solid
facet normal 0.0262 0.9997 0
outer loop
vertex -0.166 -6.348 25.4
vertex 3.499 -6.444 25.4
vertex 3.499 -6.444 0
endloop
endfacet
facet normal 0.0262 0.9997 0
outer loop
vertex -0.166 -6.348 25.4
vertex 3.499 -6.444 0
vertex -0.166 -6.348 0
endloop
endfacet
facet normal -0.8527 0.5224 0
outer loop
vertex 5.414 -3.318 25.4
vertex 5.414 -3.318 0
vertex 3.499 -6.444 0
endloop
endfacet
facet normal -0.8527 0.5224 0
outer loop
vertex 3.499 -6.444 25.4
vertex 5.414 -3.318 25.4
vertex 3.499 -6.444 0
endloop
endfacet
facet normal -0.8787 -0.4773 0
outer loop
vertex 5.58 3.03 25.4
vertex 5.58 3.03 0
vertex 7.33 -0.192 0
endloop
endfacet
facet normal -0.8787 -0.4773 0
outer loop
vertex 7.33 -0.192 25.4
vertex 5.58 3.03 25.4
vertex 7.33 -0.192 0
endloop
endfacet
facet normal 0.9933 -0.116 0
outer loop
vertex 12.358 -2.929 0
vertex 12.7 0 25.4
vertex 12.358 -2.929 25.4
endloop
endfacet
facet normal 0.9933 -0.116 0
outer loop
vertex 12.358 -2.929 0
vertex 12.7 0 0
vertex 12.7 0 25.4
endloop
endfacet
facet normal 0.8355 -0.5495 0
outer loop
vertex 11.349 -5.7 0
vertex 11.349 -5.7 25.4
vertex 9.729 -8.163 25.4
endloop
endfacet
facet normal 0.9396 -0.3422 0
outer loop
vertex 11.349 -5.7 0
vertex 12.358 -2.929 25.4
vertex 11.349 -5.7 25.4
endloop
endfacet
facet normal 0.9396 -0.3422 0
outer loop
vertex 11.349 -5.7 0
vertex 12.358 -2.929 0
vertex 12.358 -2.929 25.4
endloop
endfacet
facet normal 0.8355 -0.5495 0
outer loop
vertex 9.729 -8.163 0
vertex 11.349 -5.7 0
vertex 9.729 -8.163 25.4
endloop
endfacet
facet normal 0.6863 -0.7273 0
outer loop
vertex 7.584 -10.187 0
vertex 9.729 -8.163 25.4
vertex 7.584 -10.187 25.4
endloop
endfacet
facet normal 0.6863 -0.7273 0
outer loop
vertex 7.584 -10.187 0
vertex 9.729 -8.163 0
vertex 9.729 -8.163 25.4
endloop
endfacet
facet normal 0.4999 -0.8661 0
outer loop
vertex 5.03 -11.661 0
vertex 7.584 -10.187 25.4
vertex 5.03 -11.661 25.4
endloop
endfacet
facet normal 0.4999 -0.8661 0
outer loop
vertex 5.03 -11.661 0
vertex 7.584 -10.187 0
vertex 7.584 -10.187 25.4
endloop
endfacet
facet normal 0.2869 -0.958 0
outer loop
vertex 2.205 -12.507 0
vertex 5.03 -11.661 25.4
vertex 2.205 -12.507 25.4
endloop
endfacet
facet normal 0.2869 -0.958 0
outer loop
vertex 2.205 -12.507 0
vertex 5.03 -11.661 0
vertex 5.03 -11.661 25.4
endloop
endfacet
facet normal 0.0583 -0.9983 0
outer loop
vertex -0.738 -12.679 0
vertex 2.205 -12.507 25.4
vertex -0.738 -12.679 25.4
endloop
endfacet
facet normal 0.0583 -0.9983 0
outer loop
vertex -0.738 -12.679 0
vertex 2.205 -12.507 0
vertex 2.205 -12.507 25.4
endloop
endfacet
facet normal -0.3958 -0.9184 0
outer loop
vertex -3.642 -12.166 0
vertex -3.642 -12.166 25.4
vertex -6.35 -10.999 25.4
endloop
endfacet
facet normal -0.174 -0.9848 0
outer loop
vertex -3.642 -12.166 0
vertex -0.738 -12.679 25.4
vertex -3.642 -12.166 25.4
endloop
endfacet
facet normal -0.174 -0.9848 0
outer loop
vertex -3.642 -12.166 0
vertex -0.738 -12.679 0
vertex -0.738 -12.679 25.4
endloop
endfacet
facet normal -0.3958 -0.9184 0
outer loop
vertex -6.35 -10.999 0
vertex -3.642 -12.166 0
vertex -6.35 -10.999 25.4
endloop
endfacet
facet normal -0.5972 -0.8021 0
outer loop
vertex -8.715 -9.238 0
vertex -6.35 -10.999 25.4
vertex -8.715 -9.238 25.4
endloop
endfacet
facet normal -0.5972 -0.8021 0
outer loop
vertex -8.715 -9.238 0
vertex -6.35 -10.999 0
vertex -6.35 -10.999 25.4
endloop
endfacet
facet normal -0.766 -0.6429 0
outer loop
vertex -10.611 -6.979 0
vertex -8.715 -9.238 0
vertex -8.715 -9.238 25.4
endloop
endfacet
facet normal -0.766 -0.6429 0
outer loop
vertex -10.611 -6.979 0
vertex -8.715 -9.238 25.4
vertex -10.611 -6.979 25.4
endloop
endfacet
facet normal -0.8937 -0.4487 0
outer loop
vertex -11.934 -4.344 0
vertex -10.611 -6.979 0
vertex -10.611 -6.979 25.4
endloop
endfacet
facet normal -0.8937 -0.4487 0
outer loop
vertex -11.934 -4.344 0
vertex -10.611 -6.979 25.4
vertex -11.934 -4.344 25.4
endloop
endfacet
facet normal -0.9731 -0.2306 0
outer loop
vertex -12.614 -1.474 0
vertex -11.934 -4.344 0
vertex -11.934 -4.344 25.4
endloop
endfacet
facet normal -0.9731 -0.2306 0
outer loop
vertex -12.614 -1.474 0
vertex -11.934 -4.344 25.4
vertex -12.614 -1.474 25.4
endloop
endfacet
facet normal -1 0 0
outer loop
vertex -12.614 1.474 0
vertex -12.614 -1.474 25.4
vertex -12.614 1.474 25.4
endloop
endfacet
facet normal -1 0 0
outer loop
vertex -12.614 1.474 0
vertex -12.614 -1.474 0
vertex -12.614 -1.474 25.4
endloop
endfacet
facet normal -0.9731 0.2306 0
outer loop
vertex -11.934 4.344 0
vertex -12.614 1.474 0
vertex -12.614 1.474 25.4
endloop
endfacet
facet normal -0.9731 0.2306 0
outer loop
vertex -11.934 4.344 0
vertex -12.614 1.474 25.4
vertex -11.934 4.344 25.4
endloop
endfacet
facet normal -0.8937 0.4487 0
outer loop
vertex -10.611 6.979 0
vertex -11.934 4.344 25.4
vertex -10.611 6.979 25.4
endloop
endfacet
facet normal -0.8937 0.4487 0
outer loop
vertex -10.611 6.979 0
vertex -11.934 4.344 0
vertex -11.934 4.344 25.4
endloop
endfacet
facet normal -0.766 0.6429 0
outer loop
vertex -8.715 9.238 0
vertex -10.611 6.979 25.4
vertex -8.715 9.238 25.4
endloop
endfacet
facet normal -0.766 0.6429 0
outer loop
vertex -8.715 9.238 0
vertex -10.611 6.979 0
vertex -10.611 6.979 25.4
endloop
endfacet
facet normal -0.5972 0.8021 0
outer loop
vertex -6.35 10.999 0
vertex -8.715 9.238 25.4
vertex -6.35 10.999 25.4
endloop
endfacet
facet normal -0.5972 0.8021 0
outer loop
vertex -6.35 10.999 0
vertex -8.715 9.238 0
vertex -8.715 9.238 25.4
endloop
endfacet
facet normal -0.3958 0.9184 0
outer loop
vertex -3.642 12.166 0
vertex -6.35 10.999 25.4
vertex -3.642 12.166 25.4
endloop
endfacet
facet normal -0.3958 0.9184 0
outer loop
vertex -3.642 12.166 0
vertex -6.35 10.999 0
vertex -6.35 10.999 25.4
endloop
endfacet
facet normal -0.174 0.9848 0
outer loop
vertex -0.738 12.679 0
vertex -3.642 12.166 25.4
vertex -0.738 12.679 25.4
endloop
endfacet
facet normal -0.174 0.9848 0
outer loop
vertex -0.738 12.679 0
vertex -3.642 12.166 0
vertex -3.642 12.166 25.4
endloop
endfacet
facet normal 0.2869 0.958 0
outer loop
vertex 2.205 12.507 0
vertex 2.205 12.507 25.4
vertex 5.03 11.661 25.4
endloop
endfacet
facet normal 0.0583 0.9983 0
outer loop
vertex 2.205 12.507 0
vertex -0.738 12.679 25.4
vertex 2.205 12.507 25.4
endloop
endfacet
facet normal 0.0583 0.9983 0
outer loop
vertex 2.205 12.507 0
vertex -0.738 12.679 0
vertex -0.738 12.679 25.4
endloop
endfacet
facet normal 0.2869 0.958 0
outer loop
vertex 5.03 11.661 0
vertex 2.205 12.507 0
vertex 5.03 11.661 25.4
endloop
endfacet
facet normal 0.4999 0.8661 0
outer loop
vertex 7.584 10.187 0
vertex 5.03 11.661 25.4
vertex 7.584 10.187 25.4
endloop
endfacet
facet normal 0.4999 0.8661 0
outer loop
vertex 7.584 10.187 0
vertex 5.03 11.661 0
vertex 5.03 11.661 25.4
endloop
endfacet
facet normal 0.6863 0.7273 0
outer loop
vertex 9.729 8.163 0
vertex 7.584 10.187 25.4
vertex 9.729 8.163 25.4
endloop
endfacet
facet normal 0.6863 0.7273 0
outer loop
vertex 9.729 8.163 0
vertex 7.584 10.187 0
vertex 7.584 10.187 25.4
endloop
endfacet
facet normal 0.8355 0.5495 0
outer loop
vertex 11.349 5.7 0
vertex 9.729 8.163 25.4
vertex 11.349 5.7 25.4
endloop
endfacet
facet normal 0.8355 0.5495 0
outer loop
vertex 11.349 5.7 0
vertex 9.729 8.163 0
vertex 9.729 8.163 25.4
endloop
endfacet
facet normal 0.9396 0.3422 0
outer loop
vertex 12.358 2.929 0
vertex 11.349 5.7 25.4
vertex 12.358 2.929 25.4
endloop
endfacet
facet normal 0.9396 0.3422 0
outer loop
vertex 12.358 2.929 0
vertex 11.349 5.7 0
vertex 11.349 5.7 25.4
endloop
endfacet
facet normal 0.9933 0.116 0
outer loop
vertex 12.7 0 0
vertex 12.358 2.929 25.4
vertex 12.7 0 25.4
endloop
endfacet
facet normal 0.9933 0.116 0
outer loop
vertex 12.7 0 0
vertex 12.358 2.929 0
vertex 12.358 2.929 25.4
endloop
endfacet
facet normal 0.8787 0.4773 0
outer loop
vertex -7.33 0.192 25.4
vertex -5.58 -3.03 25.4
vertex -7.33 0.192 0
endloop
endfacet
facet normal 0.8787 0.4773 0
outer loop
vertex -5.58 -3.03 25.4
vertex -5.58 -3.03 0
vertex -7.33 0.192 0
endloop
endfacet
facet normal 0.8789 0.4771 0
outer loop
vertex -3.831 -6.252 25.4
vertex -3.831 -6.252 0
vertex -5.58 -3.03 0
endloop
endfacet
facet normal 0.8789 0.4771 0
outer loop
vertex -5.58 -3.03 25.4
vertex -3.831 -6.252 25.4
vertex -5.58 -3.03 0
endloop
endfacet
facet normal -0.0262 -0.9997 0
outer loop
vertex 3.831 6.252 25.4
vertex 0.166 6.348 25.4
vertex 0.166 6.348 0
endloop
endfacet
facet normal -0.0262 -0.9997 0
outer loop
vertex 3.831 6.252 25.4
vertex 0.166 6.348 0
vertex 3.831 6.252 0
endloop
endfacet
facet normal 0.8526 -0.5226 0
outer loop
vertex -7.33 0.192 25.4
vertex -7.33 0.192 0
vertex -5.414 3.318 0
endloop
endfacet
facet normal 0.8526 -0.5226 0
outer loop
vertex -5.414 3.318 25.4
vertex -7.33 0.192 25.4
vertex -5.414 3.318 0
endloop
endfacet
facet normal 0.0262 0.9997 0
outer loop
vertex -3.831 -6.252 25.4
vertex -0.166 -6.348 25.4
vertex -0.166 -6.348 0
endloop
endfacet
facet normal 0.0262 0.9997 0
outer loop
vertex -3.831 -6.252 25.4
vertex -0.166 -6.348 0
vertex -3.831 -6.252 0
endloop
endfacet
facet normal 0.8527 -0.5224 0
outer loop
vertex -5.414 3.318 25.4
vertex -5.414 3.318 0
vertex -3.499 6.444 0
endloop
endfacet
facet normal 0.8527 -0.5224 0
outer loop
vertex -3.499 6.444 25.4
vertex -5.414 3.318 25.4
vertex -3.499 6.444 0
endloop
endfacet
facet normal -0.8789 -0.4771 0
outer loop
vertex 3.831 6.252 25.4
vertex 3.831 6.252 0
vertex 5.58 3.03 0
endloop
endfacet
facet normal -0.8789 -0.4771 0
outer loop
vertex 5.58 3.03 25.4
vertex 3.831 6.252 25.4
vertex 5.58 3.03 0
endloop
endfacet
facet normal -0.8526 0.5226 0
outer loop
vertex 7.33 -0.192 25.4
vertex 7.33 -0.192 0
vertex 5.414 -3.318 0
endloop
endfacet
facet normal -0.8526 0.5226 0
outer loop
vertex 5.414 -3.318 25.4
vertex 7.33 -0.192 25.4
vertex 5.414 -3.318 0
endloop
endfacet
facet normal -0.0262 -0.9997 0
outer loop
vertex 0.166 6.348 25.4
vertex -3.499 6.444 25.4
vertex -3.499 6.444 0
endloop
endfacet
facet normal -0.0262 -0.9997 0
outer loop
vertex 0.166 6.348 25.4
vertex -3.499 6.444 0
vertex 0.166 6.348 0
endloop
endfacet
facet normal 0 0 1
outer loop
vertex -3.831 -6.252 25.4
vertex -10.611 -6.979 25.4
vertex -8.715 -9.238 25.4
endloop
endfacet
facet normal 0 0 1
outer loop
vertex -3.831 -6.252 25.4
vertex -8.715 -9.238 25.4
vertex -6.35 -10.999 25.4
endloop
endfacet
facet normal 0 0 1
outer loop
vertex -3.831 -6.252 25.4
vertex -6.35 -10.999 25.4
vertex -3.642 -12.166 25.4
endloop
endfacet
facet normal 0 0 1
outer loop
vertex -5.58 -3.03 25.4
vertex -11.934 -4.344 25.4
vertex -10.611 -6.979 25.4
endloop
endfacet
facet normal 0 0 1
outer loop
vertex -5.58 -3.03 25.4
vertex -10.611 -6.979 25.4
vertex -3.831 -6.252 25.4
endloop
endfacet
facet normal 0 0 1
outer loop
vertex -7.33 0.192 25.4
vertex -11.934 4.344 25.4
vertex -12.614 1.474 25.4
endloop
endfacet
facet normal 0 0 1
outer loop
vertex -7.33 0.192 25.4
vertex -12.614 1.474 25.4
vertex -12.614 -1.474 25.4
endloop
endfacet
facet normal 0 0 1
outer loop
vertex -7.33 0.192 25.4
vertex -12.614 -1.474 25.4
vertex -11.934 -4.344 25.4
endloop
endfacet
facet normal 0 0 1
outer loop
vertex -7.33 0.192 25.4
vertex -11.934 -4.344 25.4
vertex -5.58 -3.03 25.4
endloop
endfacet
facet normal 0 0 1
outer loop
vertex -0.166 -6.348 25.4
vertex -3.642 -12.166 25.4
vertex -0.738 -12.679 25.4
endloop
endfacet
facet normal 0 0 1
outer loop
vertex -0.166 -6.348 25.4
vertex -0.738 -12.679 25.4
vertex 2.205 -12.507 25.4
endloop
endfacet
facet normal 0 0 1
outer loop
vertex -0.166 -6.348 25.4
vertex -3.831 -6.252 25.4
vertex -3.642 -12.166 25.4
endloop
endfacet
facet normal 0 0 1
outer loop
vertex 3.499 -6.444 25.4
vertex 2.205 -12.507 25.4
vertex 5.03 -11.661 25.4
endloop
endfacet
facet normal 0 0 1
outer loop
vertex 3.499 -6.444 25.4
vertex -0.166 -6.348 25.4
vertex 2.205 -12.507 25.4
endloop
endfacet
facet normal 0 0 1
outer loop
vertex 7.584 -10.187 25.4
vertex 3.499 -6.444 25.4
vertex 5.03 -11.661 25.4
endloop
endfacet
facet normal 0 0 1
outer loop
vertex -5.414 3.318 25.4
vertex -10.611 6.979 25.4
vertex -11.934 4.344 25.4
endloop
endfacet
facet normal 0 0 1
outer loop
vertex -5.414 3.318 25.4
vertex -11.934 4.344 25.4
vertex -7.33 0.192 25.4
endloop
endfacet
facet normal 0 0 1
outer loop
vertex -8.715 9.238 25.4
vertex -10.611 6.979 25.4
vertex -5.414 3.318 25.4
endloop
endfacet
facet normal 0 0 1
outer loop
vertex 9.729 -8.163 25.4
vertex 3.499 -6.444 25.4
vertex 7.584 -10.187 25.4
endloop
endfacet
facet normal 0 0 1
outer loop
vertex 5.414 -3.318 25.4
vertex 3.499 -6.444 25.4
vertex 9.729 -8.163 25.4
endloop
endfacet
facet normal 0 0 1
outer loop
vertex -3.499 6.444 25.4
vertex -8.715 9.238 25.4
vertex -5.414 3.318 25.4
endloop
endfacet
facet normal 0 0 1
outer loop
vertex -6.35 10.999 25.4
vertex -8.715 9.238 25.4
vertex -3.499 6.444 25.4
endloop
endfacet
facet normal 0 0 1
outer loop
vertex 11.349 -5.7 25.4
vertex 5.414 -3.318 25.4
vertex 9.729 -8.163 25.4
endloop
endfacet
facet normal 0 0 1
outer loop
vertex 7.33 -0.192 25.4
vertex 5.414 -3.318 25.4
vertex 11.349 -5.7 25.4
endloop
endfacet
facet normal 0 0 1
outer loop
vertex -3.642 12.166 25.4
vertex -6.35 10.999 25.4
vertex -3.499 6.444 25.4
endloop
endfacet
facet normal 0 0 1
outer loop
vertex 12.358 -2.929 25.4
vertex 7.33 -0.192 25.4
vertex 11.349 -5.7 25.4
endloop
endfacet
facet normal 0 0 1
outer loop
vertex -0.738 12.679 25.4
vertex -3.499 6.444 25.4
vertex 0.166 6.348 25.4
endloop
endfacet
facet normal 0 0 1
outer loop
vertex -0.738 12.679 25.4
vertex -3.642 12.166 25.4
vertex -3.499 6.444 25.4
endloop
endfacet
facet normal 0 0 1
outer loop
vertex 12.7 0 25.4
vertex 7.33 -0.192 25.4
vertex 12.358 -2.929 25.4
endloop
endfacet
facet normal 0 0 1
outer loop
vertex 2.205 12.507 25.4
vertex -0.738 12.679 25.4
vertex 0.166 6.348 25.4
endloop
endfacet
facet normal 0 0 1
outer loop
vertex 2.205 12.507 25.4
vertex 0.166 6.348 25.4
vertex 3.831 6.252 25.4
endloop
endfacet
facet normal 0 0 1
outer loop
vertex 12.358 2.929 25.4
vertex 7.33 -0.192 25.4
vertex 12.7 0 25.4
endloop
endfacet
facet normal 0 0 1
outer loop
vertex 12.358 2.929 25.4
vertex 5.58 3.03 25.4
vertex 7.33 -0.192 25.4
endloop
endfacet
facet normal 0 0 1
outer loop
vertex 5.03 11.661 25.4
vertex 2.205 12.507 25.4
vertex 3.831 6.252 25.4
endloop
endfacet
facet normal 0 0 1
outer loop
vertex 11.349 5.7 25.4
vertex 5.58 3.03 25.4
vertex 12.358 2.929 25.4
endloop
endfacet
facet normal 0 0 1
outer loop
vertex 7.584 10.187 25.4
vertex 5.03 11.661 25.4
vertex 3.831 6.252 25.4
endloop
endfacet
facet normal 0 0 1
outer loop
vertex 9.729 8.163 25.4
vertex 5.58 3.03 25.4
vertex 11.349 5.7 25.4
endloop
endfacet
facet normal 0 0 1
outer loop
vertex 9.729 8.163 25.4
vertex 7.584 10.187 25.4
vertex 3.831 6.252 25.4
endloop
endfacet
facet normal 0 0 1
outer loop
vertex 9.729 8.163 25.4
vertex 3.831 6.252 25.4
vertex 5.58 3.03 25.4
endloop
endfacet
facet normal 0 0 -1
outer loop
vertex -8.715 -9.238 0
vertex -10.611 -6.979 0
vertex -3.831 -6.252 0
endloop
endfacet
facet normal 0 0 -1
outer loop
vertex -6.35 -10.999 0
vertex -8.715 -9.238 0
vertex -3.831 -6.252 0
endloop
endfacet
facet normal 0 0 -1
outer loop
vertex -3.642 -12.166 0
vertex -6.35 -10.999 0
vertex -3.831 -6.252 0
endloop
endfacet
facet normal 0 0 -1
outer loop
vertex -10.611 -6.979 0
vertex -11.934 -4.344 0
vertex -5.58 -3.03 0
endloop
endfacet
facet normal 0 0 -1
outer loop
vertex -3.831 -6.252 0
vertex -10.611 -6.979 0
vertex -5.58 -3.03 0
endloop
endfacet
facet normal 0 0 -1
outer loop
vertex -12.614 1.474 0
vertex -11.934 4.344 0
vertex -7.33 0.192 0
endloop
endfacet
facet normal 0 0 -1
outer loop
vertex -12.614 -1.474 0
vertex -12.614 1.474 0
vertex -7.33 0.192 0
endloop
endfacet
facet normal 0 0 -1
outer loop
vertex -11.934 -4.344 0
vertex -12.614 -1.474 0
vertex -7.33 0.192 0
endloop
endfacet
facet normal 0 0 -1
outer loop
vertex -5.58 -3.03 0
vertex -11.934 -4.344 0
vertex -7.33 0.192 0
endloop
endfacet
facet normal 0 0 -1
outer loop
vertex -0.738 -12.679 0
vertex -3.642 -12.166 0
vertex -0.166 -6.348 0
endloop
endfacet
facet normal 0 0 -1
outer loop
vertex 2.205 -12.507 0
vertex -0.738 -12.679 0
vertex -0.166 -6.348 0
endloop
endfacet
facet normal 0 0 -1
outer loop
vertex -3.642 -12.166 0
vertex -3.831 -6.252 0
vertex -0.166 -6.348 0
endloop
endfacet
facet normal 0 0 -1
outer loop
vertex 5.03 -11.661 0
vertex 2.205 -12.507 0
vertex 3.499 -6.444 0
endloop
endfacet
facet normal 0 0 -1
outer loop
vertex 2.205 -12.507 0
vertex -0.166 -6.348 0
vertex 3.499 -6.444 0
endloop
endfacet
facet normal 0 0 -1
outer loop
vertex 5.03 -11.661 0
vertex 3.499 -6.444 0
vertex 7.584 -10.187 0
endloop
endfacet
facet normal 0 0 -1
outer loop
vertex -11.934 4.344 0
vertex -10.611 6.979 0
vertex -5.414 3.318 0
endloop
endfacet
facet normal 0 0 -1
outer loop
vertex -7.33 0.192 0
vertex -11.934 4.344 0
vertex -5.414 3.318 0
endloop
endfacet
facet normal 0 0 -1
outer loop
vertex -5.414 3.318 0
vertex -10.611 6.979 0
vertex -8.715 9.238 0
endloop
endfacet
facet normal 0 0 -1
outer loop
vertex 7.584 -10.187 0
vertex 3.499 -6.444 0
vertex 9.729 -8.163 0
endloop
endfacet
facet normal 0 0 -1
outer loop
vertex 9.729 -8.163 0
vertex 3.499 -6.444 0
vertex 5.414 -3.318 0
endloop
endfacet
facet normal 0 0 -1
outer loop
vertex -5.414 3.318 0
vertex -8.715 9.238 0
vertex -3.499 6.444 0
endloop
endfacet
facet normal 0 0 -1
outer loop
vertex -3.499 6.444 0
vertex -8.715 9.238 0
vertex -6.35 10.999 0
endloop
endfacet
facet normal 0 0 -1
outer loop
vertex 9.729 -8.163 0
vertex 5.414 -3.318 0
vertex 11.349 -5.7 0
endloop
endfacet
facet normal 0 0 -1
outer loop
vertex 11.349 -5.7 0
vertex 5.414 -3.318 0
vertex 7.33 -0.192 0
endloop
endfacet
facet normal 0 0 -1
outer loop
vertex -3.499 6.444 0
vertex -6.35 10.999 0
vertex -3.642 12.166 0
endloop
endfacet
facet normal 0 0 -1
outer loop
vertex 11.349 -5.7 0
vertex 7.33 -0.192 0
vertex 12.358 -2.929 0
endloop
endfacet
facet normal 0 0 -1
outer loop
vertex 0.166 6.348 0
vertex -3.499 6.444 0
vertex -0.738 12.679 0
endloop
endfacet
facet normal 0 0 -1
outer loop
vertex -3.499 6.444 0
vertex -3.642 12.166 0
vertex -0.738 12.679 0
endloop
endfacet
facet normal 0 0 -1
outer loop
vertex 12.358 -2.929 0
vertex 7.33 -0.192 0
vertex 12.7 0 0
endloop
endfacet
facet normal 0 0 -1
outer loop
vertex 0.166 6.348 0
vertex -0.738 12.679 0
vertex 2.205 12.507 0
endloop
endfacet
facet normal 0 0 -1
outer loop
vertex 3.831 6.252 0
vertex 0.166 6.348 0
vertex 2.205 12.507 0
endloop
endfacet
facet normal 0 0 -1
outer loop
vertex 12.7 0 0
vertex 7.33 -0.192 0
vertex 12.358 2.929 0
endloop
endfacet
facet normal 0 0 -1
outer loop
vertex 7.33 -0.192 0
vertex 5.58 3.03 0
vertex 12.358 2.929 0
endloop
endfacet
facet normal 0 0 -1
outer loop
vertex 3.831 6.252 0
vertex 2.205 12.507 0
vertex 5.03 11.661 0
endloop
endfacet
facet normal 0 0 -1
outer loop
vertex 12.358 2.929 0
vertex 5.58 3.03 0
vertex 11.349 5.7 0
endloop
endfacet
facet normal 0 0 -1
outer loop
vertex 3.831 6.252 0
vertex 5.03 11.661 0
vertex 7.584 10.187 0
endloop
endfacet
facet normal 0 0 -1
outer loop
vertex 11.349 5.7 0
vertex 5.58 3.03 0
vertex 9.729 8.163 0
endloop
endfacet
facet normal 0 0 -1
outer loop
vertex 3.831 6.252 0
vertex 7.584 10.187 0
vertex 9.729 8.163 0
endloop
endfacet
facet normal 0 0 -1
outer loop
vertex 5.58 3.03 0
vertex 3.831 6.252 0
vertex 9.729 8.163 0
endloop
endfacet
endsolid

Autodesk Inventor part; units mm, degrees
ref_plane "YZ Plane" through (0, 0, 0) normal (1, 0, 0) x (0, 1, 0)
ref_plane "XZ Plane" through (0, 0, 0) normal (0, 1, 0) x (-1, 0, 0)
ref_plane "XY Plane" through (0, 0, 0) normal (0, 0, 1) x (1, 0, 0)
sketch "Sketch1" plane through (0, 0, 0) normal (0, 0, 1) x (1, 0, 0)
  circle A0 centre (0, 0) radius 6.35
  line L0 (7.3298, -0.1918) -> (3.4988, -6.4437)
  line L1 (3.4988, -6.4437) -> (-3.831, -6.2519)
  line L2 (-3.831, -6.2519) -> (-7.3298, 0.1918)
  line L3 (-7.3298, 0.1918) -> (-3.4988, 6.4437)
  line L4 (-3.4988, 6.4437) -> (3.831, 6.2519)
  line L5 (3.831, 6.2519) -> (7.3298, -0.1918)
  circle A1 centre (0, 0) radius 12.7
  point P0 (5.5804, 3.0301)
  dimension "d0" = 12.7
  dimension "d1" = 25.4
extrude "Extrusion1" add sketch "Sketch1" along normal blind 25.4
properties part number "4-bar intake (1'') spacer"
